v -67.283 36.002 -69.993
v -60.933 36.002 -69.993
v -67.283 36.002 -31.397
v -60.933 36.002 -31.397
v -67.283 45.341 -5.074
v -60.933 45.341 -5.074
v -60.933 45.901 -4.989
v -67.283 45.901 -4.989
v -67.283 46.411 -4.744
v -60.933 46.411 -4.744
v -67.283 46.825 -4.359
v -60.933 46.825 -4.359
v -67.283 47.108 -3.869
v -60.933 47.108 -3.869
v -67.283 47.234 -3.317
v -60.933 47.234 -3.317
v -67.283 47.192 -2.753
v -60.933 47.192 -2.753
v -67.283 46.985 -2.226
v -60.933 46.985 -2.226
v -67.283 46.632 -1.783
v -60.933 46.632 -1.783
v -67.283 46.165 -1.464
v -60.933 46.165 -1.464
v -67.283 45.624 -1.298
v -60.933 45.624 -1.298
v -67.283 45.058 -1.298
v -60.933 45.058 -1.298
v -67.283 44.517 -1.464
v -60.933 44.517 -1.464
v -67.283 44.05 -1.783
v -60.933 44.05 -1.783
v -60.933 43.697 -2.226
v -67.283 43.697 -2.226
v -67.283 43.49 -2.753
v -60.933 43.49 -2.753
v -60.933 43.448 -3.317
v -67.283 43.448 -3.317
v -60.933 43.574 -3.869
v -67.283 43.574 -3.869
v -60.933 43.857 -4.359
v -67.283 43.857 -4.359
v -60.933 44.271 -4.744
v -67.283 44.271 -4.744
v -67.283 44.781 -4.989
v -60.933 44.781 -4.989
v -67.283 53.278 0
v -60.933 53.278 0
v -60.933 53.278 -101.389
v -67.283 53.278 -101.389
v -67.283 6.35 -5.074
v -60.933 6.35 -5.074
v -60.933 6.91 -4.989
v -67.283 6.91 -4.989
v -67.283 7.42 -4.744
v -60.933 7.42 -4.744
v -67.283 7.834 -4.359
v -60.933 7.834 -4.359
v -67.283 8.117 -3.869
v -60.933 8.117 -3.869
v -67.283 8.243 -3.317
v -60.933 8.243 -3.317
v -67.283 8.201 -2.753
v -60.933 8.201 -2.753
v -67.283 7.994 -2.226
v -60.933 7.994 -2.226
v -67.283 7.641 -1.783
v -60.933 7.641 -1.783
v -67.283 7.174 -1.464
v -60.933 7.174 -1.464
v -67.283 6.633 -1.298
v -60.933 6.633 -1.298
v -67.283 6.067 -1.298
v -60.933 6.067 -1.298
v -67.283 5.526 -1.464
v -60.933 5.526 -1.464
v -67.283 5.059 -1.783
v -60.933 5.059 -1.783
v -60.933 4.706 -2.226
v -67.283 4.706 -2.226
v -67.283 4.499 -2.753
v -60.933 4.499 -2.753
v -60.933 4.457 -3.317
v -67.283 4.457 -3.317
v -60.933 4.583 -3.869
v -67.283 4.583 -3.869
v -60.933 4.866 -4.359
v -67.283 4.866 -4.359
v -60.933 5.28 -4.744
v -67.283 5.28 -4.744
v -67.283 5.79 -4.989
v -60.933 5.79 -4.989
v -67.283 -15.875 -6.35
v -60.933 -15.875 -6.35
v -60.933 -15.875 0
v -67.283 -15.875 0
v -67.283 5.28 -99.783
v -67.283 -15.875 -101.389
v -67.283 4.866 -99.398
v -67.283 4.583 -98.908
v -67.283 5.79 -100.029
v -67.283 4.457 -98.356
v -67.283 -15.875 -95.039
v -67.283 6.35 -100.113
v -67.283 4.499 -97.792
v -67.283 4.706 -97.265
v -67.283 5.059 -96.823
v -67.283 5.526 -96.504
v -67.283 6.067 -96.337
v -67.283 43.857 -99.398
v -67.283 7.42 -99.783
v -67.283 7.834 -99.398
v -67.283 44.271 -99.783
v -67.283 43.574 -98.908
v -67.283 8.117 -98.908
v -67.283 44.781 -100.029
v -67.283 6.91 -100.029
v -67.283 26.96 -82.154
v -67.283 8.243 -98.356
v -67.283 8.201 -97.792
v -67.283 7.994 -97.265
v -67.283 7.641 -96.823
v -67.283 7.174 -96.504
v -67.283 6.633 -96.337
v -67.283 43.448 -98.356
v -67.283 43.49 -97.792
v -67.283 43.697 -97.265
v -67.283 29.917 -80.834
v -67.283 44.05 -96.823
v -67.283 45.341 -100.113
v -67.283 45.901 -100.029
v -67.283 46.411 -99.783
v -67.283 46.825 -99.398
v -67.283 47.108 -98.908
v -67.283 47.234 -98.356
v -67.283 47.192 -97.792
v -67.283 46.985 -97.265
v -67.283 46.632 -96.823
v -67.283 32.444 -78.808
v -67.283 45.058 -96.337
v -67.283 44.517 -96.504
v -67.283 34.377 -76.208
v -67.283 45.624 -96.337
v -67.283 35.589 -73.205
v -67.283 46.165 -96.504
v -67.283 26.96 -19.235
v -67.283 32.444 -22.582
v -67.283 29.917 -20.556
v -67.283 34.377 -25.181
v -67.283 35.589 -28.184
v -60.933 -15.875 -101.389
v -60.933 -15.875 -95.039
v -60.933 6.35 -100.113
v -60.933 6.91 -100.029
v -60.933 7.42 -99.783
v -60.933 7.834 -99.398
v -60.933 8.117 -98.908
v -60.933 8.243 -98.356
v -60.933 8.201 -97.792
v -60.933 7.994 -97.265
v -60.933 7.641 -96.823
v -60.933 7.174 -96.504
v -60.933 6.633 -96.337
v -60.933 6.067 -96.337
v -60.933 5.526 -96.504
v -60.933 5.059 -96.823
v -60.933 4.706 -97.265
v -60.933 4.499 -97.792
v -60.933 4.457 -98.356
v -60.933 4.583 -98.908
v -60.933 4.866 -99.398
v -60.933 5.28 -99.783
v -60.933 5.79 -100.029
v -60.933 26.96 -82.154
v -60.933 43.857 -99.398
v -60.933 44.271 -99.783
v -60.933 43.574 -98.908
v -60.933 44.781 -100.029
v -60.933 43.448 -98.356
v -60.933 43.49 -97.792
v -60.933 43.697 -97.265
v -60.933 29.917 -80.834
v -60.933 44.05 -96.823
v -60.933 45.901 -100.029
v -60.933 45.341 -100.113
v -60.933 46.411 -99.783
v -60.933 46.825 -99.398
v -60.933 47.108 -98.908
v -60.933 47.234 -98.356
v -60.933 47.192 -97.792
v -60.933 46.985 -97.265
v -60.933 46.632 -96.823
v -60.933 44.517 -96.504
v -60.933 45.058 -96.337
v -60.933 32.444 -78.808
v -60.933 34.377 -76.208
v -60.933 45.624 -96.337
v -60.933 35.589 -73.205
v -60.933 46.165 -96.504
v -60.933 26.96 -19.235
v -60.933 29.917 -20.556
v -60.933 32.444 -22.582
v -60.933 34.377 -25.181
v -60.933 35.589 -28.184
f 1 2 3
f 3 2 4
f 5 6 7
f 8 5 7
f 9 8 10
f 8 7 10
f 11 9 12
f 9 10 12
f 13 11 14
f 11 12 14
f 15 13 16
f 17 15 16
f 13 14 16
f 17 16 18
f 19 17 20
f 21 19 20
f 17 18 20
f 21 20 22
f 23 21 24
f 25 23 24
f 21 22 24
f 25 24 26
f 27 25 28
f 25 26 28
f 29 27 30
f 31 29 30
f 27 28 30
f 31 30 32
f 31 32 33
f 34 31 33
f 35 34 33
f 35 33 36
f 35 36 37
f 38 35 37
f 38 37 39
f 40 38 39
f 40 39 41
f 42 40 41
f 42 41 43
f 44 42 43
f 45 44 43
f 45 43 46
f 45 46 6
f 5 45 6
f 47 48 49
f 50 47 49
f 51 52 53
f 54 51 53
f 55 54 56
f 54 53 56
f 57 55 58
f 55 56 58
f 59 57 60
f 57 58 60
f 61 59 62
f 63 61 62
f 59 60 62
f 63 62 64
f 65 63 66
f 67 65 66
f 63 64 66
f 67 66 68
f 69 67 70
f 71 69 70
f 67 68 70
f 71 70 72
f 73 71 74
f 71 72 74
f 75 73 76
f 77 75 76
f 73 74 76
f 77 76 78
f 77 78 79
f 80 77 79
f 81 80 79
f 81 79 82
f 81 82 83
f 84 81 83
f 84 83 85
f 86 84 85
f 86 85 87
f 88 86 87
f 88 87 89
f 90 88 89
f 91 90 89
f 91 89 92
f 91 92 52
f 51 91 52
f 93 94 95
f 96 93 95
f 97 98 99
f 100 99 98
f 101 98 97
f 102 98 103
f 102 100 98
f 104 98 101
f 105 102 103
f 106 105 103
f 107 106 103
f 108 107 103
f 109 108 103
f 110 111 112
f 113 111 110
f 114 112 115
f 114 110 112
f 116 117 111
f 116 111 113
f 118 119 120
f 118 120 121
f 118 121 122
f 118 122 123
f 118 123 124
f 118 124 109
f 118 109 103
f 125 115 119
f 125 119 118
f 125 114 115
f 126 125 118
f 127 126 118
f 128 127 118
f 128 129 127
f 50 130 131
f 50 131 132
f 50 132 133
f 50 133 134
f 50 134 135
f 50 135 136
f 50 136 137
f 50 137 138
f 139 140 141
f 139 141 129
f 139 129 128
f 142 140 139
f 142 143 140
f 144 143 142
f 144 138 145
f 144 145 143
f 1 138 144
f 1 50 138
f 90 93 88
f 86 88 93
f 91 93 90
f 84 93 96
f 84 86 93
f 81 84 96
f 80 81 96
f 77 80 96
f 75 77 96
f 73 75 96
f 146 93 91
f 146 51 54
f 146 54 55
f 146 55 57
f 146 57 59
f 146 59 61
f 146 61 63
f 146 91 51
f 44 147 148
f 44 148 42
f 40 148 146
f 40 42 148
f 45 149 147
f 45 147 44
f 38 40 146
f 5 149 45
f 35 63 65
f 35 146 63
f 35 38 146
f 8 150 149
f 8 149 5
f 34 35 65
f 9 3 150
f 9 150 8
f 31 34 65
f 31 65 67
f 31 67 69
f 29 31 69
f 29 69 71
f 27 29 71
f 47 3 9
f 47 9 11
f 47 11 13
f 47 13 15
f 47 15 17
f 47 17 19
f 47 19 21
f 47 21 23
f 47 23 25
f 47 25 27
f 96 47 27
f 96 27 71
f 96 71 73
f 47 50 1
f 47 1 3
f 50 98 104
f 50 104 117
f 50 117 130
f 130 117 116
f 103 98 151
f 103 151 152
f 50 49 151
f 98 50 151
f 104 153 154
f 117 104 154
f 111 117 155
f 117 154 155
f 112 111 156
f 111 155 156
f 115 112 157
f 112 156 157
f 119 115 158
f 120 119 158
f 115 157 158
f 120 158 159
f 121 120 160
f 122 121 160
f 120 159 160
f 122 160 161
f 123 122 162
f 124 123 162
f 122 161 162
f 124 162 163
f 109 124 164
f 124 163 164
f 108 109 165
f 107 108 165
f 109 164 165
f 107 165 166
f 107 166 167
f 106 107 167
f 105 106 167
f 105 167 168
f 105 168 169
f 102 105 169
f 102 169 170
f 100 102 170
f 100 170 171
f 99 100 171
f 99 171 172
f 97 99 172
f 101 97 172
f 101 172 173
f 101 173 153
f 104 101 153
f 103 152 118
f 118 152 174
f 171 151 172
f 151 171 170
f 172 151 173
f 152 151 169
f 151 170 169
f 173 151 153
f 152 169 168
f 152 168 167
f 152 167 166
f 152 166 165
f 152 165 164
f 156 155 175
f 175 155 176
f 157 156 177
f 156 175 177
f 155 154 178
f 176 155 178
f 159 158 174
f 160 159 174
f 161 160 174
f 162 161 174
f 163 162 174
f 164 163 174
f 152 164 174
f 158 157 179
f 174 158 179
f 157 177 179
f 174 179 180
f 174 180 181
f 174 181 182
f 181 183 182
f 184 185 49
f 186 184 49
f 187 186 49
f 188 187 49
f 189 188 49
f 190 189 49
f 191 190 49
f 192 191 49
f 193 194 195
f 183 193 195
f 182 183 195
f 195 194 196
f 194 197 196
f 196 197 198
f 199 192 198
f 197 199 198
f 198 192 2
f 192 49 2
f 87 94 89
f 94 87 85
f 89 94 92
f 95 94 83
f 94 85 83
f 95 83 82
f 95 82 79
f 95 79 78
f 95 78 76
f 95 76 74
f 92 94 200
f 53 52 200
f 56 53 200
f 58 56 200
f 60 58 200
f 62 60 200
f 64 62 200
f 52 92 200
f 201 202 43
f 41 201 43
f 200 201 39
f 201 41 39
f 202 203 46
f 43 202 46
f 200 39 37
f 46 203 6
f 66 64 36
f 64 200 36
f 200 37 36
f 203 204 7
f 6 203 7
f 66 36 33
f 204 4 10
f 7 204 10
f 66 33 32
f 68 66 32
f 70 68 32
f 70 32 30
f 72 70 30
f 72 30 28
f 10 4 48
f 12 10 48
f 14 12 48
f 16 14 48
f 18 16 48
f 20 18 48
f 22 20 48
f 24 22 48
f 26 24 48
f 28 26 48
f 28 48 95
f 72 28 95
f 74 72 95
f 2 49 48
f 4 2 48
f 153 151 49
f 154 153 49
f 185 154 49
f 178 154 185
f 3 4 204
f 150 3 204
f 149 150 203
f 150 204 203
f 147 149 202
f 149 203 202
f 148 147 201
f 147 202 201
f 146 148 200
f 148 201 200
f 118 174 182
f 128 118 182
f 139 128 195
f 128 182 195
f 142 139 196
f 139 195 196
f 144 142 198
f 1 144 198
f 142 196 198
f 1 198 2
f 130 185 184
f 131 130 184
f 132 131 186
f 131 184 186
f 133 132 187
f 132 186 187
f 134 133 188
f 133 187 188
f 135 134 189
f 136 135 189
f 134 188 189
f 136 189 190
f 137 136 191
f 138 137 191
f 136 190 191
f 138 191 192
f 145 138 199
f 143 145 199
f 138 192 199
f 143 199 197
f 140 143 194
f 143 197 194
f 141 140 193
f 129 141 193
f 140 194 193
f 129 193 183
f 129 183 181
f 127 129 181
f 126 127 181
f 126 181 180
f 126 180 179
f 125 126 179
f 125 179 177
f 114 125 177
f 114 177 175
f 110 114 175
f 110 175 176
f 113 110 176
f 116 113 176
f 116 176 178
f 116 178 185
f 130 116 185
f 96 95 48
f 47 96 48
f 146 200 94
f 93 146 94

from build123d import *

# Parameters (mm, degrees)
BOSS_EXTRUDE1_DEPTH       = 6.35
F_6_CLEARANCE_HOLE1_D     = 3.7973
F_6_CLEARANCE_HOLE1_DEPTH = 9.398
F_6_CLEARANCE_HOLE1_TIP   = 1.140824014


with BuildPart() as part:
    # Sketch1 → Boss-Extrude1 (new body)
    with BuildSketch(Plane.ZY.offset(60.933137827)):
        Polygon((-95.039403682, -15.875), (-95.039403682, 46.928467802), (-6.35, 46.928467802), (-6.35, -15.875), (0, -15.875), (0, 53.278467802), (-101.389403682, 53.278467802), (-101.389403682, -15.875), align=None)
        with BuildLine():
            Line((-6.35, 46.928467802), (-95.039403682, 46.928467802))
            Line((-95.039403682, 46.928467802), (-95.039403682, -15.875))
            Line((-95.039403682, -15.875), (-82.154349913, 26.960143079))
            ThreePointArc((-82.154349913, 26.960143079), (-77.569908616, 33.493757292), (-69.992656184, 36.001836689))
            Line((-69.992656184, 36.001836689), (-31.396747499, 36.001836689))
            ThreePointArc((-31.396747499, 36.001836689), (-23.819495066, 33.493757292), (-19.23505377, 26.960143079))
            Line((-19.23505377, 26.960143079), (-6.35, -15.875))
            Line((-6.35, -15.875), (-6.35, 46.928467802))
        make_face()
    extrude(amount=BOSS_EXTRUDE1_DEPTH)

    # #6 Clearance Hole1
    with Locations(Plane.ZY.offset(67.283137827)):
        with Locations((-3.175, 45.340967802), (-3.175, 6.35), (-98.214403682, 6.35), (-98.214403682, 45.340967802)):
            Hole(F_6_CLEARANCE_HOLE1_D / 2, depth=F_6_CLEARANCE_HOLE1_DEPTH)
            with Locations((0, 0, -(F_6_CLEARANCE_HOLE1_DEPTH + F_6_CLEARANCE_HOLE1_TIP / 2))):  # 118° drill point
                Cone(0, F_6_CLEARANCE_HOLE1_D / 2, F_6_CLEARANCE_HOLE1_TIP, mode=Mode.SUBTRACT)


solid = part.part
